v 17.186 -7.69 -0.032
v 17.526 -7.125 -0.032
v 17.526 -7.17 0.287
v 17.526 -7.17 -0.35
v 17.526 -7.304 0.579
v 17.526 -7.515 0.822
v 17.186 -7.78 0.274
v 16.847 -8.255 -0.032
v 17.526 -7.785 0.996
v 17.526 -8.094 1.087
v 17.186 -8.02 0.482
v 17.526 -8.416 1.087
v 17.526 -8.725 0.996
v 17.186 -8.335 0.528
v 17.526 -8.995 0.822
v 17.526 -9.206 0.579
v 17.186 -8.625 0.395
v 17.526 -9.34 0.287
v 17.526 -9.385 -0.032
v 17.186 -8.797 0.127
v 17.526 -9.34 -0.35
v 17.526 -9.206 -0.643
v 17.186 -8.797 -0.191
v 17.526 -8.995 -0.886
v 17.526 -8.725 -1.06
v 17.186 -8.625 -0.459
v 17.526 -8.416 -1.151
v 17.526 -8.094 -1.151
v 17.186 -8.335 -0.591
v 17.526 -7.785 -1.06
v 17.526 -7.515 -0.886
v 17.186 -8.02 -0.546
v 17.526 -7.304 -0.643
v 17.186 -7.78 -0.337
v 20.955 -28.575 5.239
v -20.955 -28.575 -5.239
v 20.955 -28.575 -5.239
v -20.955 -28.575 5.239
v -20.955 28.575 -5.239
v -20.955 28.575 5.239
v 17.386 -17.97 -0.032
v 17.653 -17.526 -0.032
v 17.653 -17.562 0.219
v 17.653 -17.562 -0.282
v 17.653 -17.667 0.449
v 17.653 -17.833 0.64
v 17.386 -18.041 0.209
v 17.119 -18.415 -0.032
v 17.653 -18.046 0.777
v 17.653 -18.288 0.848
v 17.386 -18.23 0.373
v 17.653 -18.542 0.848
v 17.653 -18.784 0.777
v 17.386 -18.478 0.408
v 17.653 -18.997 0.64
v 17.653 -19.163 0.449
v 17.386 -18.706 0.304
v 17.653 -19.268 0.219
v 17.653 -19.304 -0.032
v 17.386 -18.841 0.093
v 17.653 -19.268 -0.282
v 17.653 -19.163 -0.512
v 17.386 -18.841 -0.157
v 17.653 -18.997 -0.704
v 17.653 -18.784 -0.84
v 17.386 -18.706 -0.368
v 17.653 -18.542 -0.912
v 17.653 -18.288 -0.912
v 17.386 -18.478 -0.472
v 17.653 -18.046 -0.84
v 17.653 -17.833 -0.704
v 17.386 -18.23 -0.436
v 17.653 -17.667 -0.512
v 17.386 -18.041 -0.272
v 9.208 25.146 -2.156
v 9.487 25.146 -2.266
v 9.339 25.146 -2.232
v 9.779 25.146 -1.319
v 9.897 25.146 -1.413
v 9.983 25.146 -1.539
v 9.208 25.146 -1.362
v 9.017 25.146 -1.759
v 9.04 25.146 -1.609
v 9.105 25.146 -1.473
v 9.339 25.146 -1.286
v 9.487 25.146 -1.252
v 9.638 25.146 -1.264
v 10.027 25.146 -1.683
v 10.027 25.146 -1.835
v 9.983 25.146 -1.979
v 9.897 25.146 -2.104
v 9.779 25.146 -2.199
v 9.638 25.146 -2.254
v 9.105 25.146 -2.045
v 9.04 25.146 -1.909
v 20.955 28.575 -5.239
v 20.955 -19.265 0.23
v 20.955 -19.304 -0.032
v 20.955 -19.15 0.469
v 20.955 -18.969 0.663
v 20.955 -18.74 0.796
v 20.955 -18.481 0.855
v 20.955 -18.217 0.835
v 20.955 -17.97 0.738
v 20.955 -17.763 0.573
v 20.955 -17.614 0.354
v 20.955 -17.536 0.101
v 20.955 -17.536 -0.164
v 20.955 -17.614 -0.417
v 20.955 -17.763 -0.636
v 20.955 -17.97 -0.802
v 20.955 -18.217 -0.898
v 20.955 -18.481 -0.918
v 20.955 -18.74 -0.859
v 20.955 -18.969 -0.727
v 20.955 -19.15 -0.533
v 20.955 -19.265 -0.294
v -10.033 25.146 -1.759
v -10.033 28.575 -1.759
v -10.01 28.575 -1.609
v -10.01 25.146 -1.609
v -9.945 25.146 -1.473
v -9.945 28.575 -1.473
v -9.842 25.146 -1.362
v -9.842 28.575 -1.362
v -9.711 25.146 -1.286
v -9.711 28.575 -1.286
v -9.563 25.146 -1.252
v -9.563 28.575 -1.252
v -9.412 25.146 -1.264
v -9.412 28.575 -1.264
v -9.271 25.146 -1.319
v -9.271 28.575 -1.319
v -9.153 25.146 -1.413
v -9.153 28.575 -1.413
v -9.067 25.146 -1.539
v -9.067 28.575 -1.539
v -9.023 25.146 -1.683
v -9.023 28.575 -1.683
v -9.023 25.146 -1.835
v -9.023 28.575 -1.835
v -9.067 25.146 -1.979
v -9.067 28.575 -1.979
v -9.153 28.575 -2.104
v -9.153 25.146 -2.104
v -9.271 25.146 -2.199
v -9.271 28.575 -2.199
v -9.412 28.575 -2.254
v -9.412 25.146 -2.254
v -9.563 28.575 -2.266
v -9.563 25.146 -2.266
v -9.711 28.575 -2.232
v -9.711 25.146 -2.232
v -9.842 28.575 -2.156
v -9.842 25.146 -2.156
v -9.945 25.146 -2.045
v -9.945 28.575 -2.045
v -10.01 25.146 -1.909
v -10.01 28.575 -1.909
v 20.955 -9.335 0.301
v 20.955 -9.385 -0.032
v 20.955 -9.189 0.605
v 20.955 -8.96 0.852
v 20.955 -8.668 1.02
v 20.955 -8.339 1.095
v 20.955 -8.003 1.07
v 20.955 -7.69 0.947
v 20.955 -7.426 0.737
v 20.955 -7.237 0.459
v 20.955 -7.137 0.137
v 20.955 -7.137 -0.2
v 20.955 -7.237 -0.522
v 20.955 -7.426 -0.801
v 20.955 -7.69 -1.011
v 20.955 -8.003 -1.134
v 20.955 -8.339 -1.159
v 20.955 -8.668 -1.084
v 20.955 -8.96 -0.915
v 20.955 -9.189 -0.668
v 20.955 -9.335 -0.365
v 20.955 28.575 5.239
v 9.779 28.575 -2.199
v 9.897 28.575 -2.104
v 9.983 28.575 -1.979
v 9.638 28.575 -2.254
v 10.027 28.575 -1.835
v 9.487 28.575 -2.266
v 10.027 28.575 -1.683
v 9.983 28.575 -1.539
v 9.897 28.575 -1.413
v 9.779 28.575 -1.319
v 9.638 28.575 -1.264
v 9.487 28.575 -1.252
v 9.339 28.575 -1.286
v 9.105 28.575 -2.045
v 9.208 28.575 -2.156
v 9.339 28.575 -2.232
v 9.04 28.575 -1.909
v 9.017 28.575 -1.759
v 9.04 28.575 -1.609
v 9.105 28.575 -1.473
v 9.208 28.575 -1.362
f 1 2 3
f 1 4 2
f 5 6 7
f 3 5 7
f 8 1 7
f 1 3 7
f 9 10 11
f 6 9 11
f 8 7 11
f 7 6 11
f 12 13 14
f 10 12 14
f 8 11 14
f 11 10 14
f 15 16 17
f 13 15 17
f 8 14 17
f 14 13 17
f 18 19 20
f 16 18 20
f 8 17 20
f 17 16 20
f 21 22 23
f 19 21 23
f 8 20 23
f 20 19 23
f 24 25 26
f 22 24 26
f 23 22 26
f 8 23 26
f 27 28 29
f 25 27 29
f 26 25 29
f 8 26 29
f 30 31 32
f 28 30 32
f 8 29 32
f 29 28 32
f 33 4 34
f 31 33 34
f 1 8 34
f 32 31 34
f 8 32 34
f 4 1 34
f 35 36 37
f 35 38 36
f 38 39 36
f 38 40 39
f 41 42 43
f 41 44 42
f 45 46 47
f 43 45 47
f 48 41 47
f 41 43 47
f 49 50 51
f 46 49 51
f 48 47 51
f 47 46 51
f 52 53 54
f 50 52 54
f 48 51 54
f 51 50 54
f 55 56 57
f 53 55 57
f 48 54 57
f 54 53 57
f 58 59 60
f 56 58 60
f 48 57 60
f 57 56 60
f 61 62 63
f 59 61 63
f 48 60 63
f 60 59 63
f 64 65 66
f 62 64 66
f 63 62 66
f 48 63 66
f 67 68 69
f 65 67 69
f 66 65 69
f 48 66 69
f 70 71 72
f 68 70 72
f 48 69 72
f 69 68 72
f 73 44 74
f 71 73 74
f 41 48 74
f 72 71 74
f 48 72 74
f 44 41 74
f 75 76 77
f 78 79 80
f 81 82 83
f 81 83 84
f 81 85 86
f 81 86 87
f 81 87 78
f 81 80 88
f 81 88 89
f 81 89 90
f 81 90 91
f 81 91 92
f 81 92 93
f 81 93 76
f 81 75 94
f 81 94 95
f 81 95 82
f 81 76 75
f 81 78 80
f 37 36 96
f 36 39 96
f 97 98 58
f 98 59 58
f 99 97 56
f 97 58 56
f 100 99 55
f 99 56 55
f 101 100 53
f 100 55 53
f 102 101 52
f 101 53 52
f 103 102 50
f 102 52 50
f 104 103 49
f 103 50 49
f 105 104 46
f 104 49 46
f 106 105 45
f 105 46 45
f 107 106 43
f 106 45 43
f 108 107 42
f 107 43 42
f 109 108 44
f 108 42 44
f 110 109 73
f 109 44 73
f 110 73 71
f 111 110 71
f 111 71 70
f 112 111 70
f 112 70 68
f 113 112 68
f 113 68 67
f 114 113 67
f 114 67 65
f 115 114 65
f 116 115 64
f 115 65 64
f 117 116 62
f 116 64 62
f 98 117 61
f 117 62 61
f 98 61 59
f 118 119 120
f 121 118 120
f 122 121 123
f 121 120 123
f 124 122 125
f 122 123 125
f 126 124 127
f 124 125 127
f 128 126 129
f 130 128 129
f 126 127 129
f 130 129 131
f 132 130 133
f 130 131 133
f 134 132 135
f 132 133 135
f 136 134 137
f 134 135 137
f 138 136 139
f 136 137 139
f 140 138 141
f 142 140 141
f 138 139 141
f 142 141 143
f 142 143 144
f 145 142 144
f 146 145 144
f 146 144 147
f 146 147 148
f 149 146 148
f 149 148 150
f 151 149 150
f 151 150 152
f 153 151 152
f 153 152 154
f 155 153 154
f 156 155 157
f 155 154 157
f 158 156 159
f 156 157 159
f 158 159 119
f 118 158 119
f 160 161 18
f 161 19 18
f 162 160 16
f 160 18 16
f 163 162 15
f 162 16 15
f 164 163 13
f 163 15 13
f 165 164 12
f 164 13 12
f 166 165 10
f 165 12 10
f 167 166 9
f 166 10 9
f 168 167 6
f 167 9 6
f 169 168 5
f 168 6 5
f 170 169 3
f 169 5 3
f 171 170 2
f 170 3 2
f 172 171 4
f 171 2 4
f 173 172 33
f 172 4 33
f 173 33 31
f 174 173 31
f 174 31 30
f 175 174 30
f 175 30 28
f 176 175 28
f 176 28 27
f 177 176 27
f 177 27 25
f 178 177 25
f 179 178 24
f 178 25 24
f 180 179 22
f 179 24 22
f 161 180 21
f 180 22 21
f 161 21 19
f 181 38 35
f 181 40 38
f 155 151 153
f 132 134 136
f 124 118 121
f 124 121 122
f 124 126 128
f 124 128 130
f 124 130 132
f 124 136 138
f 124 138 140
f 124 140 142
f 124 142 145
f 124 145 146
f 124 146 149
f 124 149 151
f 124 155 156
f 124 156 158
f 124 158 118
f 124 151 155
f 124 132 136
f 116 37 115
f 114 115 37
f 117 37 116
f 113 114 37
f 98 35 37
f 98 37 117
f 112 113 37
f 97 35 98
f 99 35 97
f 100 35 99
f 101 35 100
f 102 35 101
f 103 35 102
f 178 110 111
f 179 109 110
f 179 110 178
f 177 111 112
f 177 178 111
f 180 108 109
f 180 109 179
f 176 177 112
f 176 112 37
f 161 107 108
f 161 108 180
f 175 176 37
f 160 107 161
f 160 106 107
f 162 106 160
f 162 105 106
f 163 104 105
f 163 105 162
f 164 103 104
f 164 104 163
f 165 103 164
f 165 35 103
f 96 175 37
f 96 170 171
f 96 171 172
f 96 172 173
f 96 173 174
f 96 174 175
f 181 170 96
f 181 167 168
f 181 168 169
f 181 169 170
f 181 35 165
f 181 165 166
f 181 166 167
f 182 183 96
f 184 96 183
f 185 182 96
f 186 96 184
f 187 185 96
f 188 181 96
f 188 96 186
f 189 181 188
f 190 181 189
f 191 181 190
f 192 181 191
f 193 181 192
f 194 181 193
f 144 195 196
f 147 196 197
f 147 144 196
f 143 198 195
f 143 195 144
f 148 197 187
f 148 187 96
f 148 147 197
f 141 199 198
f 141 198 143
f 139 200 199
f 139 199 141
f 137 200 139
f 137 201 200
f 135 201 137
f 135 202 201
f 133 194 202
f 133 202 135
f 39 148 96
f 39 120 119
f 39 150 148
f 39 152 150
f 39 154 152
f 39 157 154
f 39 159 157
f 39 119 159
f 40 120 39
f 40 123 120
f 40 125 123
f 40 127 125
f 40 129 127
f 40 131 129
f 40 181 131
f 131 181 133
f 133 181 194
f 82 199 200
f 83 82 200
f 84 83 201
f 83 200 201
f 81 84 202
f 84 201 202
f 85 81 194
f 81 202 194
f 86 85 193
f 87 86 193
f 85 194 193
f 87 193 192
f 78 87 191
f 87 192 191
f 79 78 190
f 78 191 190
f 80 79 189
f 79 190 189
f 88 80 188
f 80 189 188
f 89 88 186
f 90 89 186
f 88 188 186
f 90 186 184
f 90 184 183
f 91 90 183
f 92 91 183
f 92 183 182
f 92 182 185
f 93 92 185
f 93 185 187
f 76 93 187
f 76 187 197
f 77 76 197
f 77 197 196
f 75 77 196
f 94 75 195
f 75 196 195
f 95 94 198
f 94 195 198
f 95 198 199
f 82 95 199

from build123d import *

# Parameters (mm, degrees)
F1_DEPTH = 5.23875
F2_R     = 0.508
F3_DEPTH = 3.429
F5_D     = 1.778
F5_DEPTH = 3.302
F5_TIP   = 0.5341650903
F7_D     = 2.2606
F7_DEPTH = 3.429
F7_TIP   = 0.6791527577


with BuildPart() as f1:
    # F0 (on Top) → F1 (new body, symmetric)
    with BuildSketch(Plane.XY):
        Polygon((20.955, 28.575), (-20.955, -28.575), (20.955, -28.575), align=None)
        Polygon((-20.955, 28.575), (-20.955, -28.575), (20.955, 28.575), align=None)
    extrude(amount=F1_DEPTH, both=True)

    # F2 (on face) → F3 (cut)
    with BuildSketch(Plane(origin=(0, 28.575, 0), x_dir=(-1, 0, 0), z_dir=(0, 1, 0))):
        with Locations((-9.525, -1.75895)):
            Circle(F2_R)
        with Locations((9.525, -1.75895)):
            Circle(F2_R)
    extrude(amount=-F3_DEPTH, mode=Mode.SUBTRACT)

    # F5
    with Locations(Plane.YZ.offset(20.955)):
        with Locations((-18.415, -0.03175)):
            Hole(F5_D / 2, depth=F5_DEPTH)
            with Locations((0, 0, -(F5_DEPTH + F5_TIP / 2))):  # 118° drill point
                Cone(0, F5_D / 2, F5_TIP, mode=Mode.SUBTRACT)

    # F7
    with Locations(Plane.YZ.offset(20.955)):
        with Locations((-8.255, -0.03175)):
            Hole(F7_D / 2, depth=F7_DEPTH)
            with Locations((0, 0, -(F7_DEPTH + F7_TIP / 2))):  # 118° drill point
                Cone(0, F7_D / 2, F7_TIP, mode=Mode.SUBTRACT)


solid = f1.part
